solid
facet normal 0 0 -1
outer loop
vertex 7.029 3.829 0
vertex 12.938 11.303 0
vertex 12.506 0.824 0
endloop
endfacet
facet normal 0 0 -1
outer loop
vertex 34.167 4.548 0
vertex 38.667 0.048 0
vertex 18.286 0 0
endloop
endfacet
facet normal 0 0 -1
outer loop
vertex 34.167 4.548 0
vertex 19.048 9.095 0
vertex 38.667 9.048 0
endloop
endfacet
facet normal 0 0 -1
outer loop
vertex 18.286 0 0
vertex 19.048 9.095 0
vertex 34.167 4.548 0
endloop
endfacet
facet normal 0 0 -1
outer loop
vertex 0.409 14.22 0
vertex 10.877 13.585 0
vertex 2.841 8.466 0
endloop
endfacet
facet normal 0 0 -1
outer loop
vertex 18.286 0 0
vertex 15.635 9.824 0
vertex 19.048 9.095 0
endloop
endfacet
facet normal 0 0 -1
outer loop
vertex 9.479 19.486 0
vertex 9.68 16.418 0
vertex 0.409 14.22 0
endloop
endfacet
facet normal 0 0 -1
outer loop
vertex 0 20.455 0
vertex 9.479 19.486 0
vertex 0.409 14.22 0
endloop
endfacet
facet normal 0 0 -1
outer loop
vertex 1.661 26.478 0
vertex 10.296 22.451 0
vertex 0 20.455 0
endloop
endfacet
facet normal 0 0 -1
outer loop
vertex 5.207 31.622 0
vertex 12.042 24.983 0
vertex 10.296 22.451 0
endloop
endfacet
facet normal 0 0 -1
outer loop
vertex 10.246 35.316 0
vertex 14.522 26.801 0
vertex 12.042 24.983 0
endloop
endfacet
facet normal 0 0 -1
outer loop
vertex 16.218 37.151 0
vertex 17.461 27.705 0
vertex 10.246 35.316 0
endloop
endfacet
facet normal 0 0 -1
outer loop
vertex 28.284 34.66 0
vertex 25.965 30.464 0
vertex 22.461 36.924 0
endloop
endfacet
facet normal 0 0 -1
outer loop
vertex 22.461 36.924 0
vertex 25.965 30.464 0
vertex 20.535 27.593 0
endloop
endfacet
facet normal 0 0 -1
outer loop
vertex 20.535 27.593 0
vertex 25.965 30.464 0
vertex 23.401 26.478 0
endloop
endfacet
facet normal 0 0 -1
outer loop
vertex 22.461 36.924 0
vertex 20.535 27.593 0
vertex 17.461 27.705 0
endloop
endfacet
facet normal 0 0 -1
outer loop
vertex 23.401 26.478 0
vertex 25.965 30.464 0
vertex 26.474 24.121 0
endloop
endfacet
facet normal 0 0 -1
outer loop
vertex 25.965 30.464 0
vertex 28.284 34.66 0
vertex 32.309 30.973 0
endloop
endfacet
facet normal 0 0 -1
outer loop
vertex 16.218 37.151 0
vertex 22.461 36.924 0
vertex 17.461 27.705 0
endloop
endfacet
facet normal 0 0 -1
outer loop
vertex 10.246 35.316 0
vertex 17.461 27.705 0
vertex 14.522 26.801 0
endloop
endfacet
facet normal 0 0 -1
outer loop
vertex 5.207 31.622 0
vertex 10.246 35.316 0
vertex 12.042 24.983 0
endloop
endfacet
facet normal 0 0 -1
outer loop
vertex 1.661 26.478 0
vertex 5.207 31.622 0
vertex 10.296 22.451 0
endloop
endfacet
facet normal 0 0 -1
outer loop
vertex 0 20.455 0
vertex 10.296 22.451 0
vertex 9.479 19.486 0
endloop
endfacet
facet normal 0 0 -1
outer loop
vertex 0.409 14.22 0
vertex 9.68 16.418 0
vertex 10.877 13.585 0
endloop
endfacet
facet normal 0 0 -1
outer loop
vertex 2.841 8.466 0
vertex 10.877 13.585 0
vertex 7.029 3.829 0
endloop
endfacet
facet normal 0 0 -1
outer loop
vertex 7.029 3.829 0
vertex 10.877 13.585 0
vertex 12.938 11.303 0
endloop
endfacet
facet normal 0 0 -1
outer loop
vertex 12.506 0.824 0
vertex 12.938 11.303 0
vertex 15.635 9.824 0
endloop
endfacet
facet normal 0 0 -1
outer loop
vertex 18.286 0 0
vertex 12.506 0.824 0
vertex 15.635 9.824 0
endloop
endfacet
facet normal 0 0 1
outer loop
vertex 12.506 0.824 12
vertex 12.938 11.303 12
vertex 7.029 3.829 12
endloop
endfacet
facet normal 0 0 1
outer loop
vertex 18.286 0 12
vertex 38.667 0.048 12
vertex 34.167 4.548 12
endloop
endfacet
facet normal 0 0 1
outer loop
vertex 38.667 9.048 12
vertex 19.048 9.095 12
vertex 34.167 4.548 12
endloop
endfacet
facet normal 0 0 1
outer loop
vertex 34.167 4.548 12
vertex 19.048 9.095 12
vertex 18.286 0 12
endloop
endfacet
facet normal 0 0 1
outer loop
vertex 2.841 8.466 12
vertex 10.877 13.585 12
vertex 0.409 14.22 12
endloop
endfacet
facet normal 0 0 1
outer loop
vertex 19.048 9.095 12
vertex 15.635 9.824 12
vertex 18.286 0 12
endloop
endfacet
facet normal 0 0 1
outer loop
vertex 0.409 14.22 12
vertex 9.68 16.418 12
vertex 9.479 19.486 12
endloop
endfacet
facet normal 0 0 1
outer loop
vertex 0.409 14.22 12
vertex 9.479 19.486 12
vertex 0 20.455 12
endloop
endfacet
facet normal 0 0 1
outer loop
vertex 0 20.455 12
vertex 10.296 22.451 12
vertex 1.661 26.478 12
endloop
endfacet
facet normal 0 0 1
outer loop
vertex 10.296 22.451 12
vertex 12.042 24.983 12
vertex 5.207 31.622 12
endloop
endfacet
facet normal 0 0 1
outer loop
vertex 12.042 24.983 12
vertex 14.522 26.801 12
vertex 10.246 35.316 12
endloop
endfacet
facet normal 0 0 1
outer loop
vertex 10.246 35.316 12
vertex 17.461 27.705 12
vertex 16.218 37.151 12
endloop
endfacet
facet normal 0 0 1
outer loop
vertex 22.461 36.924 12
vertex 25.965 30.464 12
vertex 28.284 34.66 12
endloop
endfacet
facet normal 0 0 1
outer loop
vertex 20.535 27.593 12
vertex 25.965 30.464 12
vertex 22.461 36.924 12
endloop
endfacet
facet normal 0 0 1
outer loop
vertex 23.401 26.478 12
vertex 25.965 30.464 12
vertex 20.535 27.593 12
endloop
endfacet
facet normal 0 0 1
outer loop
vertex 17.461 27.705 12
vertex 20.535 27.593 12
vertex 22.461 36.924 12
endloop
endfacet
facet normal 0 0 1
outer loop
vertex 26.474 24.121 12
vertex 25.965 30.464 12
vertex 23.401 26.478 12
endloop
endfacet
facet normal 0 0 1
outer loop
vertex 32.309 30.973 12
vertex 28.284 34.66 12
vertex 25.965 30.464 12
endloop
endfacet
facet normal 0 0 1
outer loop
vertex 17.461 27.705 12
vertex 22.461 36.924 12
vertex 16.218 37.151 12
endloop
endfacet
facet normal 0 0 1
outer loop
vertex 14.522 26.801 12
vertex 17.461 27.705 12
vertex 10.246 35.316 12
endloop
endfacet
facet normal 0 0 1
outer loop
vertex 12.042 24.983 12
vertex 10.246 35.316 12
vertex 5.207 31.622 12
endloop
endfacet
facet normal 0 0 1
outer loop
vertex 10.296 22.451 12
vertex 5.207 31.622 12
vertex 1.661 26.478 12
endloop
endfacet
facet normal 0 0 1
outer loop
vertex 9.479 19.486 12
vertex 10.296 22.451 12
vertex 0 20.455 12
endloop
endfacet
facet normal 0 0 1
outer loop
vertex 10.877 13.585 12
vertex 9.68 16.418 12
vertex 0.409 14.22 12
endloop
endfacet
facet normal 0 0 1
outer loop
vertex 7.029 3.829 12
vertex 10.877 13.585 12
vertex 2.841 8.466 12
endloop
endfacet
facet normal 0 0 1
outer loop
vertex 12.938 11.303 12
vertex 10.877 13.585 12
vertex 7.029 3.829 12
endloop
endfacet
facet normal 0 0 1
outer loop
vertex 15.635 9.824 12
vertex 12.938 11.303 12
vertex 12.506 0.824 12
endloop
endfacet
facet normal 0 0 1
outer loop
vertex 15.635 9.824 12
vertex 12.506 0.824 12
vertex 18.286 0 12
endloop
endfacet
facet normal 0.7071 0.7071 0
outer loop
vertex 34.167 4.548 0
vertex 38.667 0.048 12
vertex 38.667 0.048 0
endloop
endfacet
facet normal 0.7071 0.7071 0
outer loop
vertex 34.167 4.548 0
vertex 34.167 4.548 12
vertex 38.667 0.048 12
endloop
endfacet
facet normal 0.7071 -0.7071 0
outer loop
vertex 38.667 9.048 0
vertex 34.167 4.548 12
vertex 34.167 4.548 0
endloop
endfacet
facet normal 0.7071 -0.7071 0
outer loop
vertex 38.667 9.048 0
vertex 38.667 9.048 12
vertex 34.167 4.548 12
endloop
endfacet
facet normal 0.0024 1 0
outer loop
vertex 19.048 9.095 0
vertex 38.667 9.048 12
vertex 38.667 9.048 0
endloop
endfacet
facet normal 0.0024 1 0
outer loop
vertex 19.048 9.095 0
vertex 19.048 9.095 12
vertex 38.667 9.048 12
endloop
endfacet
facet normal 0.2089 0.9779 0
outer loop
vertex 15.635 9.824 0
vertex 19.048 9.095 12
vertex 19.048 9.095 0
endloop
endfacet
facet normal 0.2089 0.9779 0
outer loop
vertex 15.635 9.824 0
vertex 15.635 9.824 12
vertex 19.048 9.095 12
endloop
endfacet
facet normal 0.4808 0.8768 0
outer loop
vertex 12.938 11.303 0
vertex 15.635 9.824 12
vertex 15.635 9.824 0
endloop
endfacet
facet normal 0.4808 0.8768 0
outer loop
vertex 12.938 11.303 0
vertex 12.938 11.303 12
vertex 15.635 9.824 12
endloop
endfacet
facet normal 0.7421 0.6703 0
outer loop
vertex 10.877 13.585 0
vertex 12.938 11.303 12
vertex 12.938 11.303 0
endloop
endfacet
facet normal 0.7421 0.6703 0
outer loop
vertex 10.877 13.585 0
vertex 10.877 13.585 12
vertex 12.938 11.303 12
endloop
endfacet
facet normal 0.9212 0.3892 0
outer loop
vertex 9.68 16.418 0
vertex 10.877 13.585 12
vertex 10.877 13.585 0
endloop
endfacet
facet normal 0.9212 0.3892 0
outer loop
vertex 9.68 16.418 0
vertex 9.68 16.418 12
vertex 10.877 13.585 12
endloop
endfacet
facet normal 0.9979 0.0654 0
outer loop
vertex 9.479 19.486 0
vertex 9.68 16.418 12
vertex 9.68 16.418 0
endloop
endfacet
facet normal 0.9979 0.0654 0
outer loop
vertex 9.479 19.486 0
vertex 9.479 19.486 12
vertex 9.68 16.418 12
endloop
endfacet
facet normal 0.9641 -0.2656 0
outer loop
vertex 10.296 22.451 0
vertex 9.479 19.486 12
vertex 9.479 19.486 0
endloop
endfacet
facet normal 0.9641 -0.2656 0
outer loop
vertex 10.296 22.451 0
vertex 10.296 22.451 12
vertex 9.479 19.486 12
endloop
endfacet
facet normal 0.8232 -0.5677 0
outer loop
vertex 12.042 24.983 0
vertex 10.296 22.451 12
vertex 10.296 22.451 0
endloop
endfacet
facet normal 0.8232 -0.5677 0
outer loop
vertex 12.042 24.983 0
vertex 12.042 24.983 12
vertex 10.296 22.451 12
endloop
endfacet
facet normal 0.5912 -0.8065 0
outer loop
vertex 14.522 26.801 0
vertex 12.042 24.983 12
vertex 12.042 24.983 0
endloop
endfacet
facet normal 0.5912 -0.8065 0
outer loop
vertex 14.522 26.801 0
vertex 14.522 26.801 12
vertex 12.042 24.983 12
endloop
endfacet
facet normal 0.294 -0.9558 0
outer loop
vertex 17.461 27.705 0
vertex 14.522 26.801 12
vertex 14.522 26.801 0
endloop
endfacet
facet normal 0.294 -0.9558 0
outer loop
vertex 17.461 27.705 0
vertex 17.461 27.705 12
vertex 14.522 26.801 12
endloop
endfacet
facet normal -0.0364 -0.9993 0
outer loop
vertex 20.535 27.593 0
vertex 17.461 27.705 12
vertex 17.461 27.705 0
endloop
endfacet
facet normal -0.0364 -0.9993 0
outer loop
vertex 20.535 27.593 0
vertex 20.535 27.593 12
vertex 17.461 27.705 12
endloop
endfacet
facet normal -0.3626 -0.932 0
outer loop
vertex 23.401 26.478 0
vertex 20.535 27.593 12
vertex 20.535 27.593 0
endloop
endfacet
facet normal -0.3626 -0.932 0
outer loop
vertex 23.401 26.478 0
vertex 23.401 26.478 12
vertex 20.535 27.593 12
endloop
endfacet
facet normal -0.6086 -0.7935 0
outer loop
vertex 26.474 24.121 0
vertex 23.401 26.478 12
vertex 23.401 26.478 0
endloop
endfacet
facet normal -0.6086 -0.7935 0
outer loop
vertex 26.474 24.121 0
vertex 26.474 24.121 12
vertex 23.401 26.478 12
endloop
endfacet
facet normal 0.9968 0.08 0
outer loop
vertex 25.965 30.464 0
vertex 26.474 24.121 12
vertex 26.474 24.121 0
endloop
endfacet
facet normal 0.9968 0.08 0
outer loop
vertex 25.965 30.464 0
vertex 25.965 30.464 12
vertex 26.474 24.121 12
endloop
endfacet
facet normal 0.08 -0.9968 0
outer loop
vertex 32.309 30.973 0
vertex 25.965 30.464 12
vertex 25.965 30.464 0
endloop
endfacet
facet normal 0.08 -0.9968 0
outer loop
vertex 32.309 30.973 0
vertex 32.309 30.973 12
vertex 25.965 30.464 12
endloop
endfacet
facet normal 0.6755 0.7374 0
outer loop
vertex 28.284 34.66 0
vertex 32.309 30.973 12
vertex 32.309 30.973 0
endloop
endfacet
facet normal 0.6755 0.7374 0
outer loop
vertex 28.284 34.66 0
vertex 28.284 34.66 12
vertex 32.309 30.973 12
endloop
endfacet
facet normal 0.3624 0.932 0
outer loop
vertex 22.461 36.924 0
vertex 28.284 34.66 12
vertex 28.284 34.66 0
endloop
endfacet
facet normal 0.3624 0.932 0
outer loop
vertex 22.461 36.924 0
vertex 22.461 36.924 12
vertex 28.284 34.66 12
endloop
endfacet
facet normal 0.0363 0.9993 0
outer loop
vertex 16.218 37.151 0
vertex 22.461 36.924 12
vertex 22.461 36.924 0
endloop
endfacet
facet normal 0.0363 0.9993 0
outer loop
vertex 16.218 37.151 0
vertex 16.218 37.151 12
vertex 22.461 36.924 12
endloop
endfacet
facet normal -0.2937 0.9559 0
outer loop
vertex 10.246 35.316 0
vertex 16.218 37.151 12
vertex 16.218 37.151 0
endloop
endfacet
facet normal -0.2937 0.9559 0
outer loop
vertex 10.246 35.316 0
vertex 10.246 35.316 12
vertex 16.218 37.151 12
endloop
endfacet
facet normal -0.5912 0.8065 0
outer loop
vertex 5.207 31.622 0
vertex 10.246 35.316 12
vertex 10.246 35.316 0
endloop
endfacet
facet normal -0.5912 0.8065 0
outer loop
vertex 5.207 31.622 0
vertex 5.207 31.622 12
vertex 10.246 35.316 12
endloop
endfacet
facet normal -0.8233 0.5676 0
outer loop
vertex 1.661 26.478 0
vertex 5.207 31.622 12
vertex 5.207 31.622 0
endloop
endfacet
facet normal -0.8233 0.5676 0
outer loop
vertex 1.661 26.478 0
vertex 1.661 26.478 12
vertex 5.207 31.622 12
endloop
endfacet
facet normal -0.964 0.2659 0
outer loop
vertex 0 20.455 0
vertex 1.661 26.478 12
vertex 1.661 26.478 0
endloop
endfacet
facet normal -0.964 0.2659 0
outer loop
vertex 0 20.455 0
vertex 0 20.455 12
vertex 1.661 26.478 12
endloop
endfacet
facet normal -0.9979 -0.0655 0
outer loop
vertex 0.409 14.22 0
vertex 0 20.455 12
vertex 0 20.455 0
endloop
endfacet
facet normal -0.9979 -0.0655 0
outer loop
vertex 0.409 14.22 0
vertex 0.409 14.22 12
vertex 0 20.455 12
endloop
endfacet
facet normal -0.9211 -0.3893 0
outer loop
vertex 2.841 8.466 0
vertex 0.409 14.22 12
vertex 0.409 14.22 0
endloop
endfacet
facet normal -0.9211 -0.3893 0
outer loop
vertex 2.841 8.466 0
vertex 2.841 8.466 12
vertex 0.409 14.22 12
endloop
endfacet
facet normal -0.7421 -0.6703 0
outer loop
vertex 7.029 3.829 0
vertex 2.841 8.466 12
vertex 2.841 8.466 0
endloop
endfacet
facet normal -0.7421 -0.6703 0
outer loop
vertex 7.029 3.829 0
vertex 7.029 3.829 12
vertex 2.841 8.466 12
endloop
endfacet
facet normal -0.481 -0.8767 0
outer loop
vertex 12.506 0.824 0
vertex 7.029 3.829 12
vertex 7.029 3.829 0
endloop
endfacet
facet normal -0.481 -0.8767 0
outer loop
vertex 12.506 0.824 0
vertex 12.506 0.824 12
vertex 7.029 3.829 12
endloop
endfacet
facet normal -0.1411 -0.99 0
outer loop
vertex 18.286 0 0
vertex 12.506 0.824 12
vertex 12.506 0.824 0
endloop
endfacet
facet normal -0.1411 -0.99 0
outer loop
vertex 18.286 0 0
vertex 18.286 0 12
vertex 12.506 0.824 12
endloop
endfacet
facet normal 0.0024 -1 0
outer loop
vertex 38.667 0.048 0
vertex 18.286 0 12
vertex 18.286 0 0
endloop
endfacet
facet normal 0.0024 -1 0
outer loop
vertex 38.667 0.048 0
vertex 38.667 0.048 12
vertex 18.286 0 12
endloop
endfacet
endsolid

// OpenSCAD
$fn = 32;

// ----------------------------------------------------------------------
// Eye lug: ring_tail, 12 mm thick
// ----------------------------------------------------------------------

// --- parameters (mm) ---
profile_height = 12;      // extrusion height
profile_points = 30;      // points of the closed outline

profile = [[25.965, 30.464], [32.309, 30.973], [28.284, 34.66], [22.461, 36.924], [16.218, 37.151], [10.246, 35.316], [5.207, 31.622], [1.661, 26.478], [0, 20.455], [0.409, 14.22], [2.841, 8.466], [7.029, 3.829], [12.506, 0.824], [18.286, 0], [38.667, 0.048], [34.167, 4.548], [38.667, 9.048], [19.048, 9.095], [15.635, 9.824], [12.938, 11.303], [10.877, 13.585], [9.68, 16.418], [9.479, 19.486], [10.296, 22.451], [12.042, 24.983], [14.522, 26.801], [17.461, 27.705], [20.535, 27.593], [23.401, 26.478], [26.474, 24.121]];  // single closed polygon, 30 points, counter clockwise

// --- the one profile operation ---
linear_extrude(height = profile_height) polygon(points = profile);
